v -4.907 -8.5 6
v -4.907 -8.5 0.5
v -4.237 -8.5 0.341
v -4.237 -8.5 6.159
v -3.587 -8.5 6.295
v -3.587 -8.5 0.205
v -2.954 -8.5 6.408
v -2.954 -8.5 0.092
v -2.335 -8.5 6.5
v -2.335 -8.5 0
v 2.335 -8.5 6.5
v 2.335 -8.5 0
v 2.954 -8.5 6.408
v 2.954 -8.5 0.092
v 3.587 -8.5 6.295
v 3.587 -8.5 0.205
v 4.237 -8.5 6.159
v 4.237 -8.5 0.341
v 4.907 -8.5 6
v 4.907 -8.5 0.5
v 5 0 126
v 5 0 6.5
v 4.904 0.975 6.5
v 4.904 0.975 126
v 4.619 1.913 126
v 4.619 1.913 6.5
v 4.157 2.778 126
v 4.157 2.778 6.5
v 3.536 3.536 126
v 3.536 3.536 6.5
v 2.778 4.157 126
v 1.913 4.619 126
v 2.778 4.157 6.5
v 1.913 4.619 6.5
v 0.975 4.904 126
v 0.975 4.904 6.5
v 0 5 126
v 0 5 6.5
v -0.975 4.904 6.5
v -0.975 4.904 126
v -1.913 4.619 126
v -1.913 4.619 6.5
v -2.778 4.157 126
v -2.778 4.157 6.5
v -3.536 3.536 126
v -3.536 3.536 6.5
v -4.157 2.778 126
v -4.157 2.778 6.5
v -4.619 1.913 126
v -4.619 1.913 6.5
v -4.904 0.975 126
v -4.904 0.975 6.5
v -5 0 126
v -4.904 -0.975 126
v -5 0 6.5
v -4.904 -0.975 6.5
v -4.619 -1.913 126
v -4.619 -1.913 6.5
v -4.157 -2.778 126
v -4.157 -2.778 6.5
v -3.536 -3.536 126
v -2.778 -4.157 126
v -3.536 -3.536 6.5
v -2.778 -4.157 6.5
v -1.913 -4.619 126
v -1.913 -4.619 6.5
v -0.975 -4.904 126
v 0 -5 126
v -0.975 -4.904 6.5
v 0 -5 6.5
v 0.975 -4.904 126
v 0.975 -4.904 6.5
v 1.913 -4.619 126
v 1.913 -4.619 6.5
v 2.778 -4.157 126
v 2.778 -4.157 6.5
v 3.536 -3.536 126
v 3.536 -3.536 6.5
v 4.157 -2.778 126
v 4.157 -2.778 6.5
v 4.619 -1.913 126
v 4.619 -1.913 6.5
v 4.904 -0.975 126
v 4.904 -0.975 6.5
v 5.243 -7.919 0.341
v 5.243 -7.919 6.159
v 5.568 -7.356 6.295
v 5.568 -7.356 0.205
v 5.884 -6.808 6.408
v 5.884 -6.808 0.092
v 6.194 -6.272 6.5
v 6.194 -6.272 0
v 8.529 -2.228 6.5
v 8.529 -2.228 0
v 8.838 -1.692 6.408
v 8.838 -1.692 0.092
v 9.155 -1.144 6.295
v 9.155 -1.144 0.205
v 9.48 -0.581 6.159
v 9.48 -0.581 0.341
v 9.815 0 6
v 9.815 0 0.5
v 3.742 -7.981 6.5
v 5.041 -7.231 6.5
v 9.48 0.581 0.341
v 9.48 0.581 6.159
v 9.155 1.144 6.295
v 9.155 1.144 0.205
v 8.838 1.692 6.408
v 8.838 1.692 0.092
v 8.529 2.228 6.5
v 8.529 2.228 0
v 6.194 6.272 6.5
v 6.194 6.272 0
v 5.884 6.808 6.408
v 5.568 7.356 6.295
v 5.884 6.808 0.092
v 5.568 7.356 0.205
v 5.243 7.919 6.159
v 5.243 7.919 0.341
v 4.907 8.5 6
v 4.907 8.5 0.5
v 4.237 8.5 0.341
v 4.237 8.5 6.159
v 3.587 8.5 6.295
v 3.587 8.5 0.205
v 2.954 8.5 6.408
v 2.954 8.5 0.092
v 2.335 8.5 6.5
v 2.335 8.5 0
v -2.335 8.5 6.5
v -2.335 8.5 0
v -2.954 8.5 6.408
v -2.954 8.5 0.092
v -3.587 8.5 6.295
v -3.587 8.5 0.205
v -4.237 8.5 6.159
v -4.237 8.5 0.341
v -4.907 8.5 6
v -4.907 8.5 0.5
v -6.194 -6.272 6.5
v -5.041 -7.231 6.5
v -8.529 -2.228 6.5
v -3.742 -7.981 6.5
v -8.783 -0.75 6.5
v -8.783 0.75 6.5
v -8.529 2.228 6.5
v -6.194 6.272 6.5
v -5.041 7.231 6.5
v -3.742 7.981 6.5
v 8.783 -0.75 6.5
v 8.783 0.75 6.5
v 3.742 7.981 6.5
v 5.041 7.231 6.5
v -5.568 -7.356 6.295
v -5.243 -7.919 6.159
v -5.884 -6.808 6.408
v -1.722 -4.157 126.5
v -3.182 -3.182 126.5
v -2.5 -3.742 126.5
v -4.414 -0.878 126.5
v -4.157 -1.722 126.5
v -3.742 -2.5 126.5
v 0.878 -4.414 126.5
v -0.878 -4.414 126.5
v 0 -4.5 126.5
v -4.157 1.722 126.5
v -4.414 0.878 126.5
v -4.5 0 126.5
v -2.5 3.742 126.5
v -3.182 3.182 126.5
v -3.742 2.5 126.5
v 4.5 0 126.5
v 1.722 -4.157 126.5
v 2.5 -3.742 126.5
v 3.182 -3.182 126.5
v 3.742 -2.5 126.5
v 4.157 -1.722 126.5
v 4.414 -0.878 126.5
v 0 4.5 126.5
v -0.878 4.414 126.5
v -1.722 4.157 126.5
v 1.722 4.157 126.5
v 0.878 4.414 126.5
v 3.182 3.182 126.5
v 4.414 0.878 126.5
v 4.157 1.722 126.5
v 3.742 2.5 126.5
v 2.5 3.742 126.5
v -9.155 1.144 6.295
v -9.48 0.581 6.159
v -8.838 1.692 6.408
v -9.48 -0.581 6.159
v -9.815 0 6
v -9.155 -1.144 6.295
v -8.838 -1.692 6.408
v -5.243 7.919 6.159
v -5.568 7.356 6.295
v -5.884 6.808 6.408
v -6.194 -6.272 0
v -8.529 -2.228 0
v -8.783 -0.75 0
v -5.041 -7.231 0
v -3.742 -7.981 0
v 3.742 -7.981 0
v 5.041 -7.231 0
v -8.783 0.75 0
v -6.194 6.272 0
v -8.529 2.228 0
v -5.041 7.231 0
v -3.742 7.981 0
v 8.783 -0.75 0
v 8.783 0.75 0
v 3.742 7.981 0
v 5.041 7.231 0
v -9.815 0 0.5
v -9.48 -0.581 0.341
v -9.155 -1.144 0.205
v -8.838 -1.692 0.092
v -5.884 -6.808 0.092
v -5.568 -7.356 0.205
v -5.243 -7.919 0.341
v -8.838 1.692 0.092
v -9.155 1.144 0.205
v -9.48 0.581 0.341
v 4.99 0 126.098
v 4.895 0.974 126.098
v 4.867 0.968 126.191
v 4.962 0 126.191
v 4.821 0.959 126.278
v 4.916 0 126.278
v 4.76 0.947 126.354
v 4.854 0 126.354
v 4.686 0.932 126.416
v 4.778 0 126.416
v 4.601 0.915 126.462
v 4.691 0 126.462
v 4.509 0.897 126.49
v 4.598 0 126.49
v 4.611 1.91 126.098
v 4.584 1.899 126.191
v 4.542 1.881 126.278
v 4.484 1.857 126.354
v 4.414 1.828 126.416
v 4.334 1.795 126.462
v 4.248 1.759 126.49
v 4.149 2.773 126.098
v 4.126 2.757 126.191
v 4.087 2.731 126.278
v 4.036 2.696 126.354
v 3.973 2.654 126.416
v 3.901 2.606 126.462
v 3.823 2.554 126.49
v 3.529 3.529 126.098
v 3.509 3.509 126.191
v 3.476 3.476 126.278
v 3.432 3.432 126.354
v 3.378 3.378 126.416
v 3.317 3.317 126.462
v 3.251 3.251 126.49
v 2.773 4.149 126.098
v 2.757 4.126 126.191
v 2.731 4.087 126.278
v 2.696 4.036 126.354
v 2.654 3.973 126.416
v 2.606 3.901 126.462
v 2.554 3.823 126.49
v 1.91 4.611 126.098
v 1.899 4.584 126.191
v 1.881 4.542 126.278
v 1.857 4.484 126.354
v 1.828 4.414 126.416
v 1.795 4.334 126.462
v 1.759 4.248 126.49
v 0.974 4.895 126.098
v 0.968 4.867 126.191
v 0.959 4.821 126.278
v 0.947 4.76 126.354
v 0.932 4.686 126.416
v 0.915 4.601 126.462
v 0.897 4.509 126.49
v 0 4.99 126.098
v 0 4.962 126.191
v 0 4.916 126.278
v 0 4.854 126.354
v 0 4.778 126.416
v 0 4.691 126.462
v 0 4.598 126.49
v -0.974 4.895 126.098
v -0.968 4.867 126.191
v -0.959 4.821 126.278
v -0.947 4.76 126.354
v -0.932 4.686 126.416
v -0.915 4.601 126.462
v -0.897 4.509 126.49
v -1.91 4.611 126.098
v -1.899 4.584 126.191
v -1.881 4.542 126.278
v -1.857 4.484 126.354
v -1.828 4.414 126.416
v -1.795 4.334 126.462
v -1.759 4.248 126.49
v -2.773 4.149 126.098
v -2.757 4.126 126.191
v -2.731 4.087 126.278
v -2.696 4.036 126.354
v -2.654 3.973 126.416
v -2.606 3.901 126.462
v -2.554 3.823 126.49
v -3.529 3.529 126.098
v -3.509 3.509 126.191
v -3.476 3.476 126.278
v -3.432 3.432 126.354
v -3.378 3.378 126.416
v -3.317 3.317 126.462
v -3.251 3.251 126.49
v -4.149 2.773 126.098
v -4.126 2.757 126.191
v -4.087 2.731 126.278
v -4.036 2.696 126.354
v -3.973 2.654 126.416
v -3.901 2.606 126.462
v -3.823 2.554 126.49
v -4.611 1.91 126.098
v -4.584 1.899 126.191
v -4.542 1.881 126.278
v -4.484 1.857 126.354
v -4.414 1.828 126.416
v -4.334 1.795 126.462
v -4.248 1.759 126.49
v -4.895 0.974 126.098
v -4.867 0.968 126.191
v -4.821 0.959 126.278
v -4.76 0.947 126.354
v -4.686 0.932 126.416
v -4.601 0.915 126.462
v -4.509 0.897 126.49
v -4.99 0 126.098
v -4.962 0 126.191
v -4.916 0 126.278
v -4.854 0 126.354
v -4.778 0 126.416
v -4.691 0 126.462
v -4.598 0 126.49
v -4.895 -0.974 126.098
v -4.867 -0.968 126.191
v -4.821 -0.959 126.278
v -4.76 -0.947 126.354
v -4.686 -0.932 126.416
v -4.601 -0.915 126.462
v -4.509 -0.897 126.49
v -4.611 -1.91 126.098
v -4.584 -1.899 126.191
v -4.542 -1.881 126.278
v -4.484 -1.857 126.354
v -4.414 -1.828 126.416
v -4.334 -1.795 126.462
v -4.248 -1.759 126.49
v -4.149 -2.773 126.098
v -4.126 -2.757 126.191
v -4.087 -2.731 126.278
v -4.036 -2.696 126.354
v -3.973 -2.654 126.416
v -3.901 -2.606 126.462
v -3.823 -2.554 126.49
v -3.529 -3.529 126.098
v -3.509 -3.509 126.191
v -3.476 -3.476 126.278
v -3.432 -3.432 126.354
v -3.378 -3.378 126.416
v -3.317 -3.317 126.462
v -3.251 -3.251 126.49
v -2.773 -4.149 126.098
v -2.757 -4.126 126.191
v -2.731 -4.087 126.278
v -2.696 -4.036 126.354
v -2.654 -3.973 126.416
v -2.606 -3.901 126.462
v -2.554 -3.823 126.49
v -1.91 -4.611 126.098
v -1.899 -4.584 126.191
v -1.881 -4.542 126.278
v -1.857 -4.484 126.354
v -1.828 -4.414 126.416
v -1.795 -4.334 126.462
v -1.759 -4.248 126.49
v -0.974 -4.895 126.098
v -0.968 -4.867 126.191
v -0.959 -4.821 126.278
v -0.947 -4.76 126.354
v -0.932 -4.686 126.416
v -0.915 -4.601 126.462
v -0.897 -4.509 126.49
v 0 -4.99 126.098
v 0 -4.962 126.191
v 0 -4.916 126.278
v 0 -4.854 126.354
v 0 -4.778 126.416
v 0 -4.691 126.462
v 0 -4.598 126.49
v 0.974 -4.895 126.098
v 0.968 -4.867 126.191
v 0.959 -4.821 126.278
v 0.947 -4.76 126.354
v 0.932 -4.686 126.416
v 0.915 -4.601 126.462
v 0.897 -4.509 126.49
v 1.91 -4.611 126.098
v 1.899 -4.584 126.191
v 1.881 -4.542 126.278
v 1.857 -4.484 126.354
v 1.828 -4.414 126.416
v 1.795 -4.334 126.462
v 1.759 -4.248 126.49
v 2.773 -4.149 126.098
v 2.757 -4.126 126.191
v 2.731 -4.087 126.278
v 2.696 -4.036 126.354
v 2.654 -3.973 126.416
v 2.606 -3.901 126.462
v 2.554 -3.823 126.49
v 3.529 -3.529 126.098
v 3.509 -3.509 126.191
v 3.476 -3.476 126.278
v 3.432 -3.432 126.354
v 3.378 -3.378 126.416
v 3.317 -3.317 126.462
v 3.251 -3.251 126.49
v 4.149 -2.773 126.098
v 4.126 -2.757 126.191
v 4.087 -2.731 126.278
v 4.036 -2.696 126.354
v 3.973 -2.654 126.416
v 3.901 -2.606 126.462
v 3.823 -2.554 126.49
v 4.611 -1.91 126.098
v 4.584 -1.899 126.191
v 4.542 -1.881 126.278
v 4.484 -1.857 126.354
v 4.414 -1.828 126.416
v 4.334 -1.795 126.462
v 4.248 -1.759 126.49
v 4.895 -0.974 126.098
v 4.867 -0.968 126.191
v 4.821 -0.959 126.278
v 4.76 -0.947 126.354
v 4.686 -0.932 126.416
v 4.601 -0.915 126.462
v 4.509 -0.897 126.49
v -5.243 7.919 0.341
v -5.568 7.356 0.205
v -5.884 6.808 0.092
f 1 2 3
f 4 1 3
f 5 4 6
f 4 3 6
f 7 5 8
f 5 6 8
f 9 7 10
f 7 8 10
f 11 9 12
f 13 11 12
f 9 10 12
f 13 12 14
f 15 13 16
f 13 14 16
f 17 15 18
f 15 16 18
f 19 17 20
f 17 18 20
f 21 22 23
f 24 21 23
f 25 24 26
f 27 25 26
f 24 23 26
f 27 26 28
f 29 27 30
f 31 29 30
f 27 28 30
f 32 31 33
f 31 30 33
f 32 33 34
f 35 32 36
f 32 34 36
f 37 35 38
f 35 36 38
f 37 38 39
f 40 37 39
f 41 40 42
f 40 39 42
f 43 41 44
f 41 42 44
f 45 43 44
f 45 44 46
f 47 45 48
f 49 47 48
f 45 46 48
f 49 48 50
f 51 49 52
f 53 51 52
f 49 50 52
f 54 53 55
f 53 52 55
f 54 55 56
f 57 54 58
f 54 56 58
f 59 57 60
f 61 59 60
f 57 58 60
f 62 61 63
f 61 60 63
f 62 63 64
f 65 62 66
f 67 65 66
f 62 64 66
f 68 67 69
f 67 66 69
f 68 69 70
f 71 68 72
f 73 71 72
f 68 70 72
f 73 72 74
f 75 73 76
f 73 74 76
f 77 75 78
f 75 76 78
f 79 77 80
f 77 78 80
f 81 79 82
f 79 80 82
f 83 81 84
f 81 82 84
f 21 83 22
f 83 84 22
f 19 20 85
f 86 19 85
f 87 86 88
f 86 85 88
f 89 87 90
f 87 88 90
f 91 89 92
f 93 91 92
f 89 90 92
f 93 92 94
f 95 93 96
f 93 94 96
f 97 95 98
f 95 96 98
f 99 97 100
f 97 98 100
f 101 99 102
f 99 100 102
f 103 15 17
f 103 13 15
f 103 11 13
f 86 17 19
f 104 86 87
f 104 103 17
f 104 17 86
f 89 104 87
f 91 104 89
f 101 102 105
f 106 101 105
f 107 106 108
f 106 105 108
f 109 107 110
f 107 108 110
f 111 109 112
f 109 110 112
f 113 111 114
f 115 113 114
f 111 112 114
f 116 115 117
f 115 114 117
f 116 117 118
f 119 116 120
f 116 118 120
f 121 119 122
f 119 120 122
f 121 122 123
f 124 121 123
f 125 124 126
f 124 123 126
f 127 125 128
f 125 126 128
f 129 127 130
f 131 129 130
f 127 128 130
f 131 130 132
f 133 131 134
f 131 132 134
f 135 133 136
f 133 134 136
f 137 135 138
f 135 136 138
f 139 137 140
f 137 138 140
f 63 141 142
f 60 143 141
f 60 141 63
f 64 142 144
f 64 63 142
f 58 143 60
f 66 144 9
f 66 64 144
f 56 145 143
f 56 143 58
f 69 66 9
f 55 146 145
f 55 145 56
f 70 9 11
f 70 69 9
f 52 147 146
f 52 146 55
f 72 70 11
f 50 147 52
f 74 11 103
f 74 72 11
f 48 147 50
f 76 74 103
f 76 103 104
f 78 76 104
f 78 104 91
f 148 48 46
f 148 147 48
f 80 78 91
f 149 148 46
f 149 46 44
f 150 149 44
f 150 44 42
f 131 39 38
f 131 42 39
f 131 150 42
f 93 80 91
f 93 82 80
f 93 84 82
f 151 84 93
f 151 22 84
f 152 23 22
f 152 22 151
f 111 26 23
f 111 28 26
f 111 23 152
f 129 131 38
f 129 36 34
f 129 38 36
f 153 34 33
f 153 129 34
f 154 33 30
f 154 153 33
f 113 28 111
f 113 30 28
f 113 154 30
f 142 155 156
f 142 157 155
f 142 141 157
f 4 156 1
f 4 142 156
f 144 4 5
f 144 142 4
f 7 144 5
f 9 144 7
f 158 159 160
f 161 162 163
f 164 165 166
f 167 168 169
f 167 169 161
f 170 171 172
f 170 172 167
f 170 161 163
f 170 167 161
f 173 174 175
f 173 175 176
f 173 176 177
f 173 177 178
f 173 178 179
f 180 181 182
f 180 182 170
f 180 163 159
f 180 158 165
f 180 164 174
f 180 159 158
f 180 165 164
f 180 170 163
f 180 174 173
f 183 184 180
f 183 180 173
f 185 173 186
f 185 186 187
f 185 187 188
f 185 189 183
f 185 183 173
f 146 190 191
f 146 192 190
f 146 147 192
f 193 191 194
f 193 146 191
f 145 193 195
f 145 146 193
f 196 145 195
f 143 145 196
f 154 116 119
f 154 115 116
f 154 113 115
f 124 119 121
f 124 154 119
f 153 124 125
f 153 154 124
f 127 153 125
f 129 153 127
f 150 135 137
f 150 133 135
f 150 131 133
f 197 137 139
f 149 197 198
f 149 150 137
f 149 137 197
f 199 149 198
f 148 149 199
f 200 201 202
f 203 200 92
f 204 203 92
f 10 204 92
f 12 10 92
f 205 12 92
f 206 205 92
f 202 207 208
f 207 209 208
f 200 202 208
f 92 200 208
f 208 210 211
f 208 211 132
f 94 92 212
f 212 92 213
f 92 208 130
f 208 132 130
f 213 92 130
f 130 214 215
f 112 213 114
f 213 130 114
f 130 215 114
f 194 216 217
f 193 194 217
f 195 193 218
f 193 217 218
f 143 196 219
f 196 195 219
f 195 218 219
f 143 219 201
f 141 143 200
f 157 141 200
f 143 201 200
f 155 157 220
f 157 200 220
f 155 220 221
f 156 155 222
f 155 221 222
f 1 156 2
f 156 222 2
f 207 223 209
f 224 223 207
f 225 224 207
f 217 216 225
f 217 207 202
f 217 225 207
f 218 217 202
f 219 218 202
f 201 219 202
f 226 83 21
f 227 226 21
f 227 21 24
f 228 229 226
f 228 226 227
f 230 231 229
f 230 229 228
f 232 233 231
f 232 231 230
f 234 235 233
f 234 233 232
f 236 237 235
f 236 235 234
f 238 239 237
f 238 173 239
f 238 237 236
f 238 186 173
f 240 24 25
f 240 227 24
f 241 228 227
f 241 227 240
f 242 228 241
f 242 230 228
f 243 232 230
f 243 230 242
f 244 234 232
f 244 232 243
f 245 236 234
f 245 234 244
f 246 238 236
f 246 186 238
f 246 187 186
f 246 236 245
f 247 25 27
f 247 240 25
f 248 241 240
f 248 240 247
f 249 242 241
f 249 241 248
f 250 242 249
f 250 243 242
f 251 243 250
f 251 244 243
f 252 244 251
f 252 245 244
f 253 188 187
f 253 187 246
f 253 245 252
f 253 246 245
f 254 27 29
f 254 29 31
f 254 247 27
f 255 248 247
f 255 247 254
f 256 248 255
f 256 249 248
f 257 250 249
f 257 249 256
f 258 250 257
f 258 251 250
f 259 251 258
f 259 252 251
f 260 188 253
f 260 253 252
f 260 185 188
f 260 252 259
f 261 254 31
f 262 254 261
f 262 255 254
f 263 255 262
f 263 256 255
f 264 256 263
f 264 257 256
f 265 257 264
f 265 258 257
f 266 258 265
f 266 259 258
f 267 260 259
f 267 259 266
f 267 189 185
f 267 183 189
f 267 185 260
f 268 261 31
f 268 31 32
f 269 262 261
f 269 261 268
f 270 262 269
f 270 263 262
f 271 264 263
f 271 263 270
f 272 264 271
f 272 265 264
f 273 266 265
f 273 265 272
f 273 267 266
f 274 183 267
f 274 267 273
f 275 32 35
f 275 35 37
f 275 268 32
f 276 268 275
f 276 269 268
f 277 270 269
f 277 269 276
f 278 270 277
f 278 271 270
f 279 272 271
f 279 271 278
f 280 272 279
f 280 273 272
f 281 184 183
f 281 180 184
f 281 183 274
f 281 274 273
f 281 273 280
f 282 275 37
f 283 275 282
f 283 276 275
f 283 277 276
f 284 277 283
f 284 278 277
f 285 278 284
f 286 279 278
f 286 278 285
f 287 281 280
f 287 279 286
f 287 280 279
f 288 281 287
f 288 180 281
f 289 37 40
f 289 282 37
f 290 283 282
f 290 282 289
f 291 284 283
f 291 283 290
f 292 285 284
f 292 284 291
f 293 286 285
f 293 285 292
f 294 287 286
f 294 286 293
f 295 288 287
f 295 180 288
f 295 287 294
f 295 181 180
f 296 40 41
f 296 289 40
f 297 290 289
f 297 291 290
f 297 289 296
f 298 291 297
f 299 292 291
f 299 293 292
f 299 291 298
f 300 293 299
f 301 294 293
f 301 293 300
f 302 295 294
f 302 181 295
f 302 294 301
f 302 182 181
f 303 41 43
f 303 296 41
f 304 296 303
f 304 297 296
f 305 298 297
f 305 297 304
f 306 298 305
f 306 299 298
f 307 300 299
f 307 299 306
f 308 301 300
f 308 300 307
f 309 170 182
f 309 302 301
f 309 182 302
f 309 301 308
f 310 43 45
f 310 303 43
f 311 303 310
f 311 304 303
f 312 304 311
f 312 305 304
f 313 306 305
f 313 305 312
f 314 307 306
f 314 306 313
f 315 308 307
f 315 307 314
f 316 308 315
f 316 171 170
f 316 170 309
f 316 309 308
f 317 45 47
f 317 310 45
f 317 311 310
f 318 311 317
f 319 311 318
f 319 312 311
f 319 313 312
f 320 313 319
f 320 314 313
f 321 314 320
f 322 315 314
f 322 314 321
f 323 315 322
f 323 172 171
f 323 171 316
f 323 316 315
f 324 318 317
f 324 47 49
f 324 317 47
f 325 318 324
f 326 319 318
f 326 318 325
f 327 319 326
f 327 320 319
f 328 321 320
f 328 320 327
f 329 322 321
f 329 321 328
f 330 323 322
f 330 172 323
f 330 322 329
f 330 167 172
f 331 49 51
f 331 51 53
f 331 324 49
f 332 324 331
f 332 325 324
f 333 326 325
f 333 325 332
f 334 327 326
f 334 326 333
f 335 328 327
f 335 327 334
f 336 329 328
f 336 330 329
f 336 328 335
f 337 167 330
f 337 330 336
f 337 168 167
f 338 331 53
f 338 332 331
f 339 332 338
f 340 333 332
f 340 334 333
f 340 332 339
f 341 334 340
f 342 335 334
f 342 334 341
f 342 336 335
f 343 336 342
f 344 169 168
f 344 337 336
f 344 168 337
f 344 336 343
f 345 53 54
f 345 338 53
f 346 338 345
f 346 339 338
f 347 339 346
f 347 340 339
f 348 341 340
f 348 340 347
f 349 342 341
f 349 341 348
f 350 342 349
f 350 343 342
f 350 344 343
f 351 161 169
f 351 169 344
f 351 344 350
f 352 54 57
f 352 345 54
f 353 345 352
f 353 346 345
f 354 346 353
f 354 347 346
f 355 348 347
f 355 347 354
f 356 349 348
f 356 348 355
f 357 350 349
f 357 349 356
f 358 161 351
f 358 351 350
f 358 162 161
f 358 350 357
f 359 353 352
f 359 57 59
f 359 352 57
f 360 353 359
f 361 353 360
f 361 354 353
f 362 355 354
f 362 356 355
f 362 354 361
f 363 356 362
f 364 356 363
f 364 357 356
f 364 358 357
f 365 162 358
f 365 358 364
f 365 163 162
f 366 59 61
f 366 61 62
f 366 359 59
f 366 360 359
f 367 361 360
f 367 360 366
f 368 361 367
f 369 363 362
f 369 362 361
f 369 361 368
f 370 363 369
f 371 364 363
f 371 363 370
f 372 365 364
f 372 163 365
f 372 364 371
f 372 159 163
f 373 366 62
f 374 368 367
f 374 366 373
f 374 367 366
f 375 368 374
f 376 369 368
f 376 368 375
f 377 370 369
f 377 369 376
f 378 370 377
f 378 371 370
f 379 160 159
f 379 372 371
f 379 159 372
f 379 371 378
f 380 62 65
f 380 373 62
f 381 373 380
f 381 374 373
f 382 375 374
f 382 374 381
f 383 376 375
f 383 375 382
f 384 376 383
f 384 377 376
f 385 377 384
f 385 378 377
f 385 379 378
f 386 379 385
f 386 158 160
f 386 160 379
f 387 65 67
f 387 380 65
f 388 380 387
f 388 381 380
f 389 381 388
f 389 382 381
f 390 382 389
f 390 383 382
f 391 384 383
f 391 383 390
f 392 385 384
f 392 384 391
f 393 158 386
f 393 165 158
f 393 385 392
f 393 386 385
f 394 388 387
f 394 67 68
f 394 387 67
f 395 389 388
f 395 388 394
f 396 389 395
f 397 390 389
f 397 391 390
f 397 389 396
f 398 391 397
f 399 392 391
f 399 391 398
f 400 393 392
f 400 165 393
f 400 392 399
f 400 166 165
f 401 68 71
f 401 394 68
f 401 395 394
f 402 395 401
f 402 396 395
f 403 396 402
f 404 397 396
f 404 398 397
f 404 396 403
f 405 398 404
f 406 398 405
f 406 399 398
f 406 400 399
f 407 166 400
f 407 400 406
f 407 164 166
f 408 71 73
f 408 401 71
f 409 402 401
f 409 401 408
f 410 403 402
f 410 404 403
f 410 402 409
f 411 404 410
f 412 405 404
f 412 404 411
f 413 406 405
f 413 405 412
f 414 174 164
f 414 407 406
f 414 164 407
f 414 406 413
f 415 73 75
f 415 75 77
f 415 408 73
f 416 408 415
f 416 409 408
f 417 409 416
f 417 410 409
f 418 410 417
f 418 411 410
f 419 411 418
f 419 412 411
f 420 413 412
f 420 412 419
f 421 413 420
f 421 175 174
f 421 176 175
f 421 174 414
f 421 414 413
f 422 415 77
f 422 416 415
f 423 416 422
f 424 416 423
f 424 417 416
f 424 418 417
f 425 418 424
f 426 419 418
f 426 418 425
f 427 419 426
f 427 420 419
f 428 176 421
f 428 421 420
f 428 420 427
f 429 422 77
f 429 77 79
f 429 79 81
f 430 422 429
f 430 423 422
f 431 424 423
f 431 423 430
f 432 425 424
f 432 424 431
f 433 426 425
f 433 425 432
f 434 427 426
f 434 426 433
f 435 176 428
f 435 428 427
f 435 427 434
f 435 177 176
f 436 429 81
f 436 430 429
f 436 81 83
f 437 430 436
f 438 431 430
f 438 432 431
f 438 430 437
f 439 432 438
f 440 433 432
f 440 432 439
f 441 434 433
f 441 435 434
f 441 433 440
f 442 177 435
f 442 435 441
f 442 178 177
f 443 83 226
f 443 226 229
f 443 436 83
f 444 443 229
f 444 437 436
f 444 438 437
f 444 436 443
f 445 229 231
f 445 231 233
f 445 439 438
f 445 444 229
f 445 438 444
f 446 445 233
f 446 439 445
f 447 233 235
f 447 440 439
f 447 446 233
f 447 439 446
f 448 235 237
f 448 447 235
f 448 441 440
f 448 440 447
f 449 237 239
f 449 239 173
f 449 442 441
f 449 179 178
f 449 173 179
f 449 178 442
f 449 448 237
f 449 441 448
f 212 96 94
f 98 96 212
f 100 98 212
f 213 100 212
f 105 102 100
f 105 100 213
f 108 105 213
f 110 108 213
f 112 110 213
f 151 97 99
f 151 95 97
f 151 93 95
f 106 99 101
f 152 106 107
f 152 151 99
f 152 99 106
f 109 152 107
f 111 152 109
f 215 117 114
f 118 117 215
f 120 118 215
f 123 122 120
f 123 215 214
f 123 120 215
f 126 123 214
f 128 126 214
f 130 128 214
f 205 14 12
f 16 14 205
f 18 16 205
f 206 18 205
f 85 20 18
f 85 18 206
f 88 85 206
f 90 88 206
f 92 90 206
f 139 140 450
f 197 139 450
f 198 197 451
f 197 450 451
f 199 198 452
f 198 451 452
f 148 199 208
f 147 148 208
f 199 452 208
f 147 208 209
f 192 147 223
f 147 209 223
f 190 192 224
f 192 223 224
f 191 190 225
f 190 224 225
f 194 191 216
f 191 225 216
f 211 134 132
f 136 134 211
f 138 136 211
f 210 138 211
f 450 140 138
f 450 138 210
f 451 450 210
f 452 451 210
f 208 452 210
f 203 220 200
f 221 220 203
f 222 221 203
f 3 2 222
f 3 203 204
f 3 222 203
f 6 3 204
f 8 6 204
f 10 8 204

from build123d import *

# Parameters (mm, degrees)
Y_KSEKLIK_EKSTR_ZYON1_DEPTH = 6.5
IZIM2_R                     = 5
Y_KSEKLIK_EKSTR_ZYON2_DEPTH = 120
RADYUS1_R                   = 0.5


with BuildPart() as part:
    # Çizim1 → Yükseklik-Ekstrüzyon1 (new body)
    with BuildSketch(Plane.XY):
        Polygon((9.814954576, 0), (4.907477288, 8.5), (-4.907477288, 8.5), (-9.814954576, 0), (-4.907477288, -8.5), (4.907477288, -8.5), align=None)
    extrude(amount=Y_KSEKLIK_EKSTR_ZYON1_DEPTH)

    # Çizim2 → Yükseklik-Ekstrüzyon2 (add)
    with BuildSketch(Plane.XY.offset(6.5)):
        Circle(IZIM2_R)
    extrude(amount=Y_KSEKLIK_EKSTR_ZYON2_DEPTH)

    # Çizim3 → Kes-Döndür1 (revolve, cut)
    with BuildSketch(Plane(origin=(0, 0, 0), x_dir=(1, 0, 0), z_dir=(0, 1, 0))):
        Polygon((-9.814954576, 0), (-8.814954576, 0), (-9.814954576, -0.5), align=None)
        Polygon((-9.814954576, -6.5), (-9.814954576, -6), (-8.814954576, -6.5), align=None)
    revolve(axis=Axis((0, 0, 0), (0, 0, 1)), mode=Mode.SUBTRACT)

    # Radyus1
    radyus1_edges = [part.edges().sort_by_distance(p)[0] for p in [
        (-5, 0, 126.5),
    ]]
    fillet(radyus1_edges, radius=RADYUS1_R)


solid = part.part
